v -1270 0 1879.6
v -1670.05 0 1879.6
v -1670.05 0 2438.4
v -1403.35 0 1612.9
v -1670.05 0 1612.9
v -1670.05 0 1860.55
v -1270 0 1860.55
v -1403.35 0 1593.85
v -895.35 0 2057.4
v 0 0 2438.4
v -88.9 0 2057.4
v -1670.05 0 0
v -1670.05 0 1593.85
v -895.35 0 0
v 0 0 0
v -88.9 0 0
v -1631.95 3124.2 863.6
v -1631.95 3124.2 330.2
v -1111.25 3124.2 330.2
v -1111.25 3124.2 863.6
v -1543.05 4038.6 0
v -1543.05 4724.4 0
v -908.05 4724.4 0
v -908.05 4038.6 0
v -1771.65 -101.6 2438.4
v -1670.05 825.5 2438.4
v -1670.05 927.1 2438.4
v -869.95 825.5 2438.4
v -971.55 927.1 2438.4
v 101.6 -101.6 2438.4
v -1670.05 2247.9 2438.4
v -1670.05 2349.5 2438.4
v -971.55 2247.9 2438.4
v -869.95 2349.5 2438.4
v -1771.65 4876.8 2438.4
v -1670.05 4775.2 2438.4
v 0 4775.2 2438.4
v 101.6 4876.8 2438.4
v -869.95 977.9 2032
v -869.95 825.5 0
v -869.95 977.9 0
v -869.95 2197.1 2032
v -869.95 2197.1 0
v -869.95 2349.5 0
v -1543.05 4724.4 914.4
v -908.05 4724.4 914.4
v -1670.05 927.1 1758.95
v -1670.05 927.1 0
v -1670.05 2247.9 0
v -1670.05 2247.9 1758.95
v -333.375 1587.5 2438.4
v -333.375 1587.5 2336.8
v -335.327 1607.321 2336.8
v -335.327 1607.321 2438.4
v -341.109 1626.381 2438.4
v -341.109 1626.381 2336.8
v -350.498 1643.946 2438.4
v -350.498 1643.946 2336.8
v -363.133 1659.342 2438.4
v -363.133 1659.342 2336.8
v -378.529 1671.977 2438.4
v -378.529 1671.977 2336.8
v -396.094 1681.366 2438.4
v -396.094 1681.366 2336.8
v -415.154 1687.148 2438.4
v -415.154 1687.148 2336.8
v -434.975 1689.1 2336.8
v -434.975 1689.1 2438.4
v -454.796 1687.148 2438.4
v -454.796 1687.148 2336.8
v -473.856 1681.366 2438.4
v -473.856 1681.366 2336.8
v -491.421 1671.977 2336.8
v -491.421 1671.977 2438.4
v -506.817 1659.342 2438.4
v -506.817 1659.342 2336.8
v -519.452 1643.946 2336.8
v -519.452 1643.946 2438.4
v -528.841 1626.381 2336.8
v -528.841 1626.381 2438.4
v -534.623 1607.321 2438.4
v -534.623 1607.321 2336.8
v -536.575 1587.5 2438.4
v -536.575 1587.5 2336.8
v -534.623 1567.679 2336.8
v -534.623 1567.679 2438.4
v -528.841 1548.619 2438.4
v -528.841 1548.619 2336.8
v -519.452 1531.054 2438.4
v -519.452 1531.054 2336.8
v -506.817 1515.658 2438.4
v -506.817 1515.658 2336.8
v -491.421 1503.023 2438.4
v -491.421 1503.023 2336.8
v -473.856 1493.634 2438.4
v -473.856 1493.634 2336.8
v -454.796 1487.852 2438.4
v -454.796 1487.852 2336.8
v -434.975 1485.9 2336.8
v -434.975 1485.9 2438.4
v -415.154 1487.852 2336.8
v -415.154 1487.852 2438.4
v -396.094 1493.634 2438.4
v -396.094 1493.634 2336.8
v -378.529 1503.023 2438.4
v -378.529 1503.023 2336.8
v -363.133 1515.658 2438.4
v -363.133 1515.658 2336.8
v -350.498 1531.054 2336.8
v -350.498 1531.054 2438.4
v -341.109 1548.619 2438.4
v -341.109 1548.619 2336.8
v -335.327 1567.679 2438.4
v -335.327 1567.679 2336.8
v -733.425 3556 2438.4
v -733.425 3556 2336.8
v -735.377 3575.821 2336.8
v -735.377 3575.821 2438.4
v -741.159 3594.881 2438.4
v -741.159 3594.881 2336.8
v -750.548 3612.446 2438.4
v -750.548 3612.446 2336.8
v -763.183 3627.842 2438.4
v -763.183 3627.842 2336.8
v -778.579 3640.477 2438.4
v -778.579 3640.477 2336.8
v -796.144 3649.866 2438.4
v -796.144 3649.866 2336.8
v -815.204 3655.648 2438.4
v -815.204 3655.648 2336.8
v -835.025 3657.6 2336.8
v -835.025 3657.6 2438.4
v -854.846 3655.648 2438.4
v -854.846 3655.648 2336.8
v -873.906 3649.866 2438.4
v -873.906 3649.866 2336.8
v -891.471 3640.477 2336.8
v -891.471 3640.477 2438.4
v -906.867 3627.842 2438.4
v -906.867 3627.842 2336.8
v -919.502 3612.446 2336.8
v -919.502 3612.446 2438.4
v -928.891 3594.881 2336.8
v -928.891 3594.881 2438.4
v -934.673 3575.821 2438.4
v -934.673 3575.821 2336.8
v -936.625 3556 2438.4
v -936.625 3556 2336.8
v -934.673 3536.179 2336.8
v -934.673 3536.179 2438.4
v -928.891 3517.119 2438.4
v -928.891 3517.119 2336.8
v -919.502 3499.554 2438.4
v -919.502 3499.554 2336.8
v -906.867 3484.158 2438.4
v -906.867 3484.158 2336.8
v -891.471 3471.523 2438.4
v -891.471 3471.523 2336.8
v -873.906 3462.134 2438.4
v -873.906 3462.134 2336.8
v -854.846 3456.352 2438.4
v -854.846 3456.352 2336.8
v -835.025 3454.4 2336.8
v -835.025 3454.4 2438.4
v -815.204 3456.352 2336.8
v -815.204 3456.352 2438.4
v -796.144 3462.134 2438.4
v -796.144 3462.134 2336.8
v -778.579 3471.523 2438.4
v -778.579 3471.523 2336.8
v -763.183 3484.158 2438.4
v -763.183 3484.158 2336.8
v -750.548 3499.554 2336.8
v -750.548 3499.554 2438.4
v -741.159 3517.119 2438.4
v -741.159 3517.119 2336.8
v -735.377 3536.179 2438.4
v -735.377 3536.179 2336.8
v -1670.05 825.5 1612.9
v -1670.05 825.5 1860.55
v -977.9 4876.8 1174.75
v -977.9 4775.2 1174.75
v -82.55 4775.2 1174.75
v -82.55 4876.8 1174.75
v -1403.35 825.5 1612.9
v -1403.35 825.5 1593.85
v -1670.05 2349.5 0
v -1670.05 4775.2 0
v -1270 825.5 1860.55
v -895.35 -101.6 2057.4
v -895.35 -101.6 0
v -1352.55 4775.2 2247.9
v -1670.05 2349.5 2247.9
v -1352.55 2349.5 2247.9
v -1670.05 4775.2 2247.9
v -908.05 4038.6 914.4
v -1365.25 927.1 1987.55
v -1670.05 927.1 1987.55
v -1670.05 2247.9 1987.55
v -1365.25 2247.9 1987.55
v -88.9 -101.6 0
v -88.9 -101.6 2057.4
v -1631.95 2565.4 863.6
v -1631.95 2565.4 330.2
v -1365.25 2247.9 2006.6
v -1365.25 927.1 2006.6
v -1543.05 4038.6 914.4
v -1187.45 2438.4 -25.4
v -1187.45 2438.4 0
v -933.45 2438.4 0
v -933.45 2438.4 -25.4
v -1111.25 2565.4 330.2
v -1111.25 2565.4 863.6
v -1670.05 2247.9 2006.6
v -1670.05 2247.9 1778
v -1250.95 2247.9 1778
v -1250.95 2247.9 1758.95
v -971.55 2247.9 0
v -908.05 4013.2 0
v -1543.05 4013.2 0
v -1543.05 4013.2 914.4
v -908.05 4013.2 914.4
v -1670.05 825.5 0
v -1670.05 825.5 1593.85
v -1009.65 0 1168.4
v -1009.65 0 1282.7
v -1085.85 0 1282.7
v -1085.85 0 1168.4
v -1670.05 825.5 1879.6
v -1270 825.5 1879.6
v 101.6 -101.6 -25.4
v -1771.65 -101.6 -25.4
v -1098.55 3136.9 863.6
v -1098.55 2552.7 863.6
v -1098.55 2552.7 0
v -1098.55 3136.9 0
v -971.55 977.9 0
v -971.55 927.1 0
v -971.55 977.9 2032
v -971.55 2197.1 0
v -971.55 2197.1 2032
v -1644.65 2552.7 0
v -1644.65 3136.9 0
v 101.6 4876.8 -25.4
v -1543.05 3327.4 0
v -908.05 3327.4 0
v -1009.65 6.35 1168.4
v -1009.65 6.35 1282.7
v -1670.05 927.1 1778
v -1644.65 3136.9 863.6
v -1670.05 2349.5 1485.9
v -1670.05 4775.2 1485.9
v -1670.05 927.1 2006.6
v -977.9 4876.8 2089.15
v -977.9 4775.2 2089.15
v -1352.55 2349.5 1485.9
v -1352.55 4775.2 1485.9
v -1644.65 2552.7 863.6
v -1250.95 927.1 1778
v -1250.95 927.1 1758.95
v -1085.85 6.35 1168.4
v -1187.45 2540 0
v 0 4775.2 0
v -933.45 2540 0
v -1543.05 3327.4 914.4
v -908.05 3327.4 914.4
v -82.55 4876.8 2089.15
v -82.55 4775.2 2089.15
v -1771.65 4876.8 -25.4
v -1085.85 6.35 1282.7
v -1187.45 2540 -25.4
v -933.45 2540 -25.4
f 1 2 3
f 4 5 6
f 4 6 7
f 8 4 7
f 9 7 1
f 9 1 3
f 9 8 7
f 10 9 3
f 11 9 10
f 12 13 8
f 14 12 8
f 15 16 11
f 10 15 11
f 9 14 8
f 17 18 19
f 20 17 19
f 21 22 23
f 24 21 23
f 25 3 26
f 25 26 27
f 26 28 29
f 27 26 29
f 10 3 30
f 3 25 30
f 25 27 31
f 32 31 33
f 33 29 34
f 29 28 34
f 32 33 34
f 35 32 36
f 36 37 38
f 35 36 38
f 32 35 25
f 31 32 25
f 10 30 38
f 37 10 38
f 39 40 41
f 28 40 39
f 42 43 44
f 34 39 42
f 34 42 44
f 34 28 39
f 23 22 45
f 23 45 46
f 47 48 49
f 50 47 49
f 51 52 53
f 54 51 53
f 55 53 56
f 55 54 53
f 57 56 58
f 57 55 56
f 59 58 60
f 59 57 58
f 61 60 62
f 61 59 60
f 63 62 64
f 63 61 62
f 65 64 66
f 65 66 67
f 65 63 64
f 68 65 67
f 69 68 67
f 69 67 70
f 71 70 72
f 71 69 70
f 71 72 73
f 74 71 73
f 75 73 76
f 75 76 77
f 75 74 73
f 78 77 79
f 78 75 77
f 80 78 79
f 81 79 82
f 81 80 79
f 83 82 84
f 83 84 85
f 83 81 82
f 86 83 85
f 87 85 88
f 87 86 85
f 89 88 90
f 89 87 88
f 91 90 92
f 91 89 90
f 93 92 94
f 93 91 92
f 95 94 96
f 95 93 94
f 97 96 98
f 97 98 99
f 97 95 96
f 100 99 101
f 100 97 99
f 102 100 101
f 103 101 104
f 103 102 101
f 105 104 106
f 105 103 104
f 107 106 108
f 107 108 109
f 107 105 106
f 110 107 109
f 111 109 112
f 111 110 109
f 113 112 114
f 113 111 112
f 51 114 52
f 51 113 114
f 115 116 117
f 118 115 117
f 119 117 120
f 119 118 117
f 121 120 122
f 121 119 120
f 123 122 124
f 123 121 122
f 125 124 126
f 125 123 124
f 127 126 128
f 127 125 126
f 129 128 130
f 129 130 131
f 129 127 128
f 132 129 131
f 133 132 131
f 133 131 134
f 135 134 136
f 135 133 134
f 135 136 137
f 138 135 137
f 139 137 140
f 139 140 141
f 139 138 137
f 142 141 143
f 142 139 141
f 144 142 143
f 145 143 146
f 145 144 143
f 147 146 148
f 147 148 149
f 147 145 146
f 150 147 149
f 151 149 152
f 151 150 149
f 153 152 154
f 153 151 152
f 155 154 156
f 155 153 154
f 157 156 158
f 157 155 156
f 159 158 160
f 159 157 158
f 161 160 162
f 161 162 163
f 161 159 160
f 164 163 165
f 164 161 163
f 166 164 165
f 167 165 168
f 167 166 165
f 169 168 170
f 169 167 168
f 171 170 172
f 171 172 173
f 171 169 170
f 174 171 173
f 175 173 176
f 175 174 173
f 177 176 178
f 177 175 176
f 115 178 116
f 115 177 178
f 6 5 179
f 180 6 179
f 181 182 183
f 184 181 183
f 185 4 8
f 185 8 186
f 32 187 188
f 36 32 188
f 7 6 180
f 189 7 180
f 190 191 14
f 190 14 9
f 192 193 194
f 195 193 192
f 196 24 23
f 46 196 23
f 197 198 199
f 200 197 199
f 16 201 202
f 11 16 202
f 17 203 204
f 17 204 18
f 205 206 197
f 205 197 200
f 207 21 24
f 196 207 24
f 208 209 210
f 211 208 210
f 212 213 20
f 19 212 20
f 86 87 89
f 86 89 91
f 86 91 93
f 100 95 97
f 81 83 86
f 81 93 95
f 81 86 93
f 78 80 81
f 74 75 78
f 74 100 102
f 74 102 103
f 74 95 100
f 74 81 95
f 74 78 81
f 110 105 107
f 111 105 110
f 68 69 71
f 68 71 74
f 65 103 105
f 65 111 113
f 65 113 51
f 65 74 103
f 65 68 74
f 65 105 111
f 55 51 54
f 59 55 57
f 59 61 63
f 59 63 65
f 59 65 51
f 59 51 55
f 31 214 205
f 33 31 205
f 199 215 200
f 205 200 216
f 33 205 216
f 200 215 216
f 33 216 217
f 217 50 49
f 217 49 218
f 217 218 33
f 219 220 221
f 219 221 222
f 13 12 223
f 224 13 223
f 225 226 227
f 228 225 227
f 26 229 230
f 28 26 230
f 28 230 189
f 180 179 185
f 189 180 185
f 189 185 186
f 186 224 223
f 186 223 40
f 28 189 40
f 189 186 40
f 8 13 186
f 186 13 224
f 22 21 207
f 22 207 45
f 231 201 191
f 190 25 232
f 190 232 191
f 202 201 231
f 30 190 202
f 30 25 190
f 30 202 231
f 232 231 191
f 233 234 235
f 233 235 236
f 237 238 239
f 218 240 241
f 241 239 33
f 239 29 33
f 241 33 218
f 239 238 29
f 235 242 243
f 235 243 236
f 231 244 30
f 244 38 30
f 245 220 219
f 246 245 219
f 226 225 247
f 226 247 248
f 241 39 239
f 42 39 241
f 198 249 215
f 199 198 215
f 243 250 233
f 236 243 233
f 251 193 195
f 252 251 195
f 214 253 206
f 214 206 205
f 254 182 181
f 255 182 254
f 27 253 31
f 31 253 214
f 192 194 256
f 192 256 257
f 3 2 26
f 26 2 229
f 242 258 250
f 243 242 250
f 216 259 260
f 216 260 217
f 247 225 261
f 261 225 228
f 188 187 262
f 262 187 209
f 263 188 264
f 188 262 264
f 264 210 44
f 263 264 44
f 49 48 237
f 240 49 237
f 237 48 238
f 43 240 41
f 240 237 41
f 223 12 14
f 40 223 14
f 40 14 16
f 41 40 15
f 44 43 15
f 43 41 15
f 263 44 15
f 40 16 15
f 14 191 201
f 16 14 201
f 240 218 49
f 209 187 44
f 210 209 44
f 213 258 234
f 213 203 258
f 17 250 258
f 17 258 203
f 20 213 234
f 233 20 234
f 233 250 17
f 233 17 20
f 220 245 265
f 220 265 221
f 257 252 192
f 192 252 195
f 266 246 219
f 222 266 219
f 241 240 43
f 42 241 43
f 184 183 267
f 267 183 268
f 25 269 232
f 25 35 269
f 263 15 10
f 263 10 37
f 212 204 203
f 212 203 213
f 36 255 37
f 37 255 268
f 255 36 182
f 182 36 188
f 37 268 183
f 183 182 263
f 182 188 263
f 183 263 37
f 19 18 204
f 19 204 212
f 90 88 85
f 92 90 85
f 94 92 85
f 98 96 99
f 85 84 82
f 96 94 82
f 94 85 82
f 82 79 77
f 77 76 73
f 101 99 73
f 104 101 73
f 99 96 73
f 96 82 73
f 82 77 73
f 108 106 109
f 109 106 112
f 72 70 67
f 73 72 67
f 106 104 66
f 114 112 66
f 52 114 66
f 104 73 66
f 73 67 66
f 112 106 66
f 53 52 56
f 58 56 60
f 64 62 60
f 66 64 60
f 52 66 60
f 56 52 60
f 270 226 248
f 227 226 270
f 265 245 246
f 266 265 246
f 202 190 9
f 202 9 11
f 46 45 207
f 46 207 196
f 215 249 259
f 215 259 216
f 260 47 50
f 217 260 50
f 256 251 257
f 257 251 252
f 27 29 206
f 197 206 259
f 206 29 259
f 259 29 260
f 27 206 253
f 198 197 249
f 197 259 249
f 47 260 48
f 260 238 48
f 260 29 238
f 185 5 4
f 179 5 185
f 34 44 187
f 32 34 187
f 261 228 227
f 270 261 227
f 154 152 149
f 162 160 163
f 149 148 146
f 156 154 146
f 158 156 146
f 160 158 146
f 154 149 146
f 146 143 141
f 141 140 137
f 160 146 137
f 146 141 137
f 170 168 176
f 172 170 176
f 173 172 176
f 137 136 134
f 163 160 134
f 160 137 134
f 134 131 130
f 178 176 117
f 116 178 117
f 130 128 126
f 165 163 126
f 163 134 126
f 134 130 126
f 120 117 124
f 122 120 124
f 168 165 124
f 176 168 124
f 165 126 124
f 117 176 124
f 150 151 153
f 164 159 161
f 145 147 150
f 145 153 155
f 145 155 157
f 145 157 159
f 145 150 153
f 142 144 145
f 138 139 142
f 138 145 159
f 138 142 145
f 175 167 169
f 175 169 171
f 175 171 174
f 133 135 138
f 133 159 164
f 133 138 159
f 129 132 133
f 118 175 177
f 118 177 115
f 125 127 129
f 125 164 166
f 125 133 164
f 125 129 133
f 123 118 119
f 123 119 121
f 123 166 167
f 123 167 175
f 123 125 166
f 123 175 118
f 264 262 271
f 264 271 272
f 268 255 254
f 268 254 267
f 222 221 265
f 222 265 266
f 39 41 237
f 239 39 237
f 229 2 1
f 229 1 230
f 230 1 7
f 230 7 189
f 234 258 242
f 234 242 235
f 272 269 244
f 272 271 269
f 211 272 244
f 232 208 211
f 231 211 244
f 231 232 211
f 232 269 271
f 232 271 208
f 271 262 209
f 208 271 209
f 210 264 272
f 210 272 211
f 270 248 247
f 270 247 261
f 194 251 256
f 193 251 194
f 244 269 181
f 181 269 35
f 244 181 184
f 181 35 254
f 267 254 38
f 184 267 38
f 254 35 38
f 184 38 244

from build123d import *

# Parameters (mm, degrees)
F0_W      = 1873.25
F0_H      = 4978.4
F0_W_2    = 1670.05
F0_H_2    = 4775.2
F1_DEPTH  = 2438.4
F2_W      = 806.45
F2_H      = 2057.4
F3_DEPTH  = 101.6
F4_W      = 895.35
F4_H      = 914.4
F5_DEPTH  = 101.6
F6_W      = 1873.25
F6_H      = 4978.4
F6_W_2    = 254
F6_H_2    = 101.6
F7_DEPTH  = 25.4
F9_DEPTH  = 2438.4
F10_W     = 1219.2
F10_H     = 406.4
F11_DEPTH = 101.6
F12_W     = 635
F12_H     = 685.8
F13_DEPTH = 914.4
F14_W     = 546.1
F14_H     = 584.2
F15_DEPTH = 863.6
F17_W     = 2425.7
F17_H     = 762
F18_DEPTH = 317.5
F16_W     = 520.7
F16_H     = 558.8
F19_DEPTH = 533.4
F20_W     = 825.5
F20_H     = 19.05
F21_DEPTH = 400.05
F22_W     = 825.5
F22_H     = 19.05
F23_DEPTH = 266.7
F24_W     = 1320.8
F24_H     = 19.05
F25_DEPTH = 304.8
F26_W     = 1320.8
F26_H     = 19.05
F27_DEPTH = 419.1
F28_W     = 76.2
F28_H     = 114.3
F29_DEPTH = 6.35
F30_R     = 101.6
F31_DEPTH = 101.6


with BuildPart() as f1:
    # F0 (on Top) → F1 (new body)
    with BuildSketch(Plane.XY):
        with Locations((-835.025, 2387.6)):
            Rectangle(F0_W, F0_H)
        with Locations((-835.025, 2387.6)):
            Rectangle(F0_W_2, F0_H_2, mode=Mode.SUBTRACT)
    extrude(amount=F1_DEPTH)

    # F2 (on face) → F3 (cut, through all)
    with BuildSketch(Plane.XZ.offset(101.6)):
        with Locations((-492.125, 1028.7)):
            Rectangle(F2_W, F2_H)
    extrude(amount=-F3_DEPTH, mode=Mode.SUBTRACT)

    # F4 (on face) → F5 (cut, through all)
    with BuildSketch(Plane.XZ.offset(-4775.2)):
        with Locations((-530.225, 1631.95)):
            Rectangle(F4_W, F4_H)
    extrude(amount=-F5_DEPTH, mode=Mode.SUBTRACT)

    # F6 (on face) → F7 (join)
    with BuildSketch(Plane(origin=(0, 0, 0), x_dir=(1, 0, 0), z_dir=(0, 0, -1))):
        with Locations((-835.025, -2387.6)):
            Rectangle(F6_W, F6_H)
        with Locations((-1060.45, -2489.2)):
            Rectangle(F6_W_2, F6_H_2, mode=Mode.SUBTRACT)
    extrude(amount=F7_DEPTH)

    # F8 (on face) → F9 (join, through all)
    with BuildSketch(Plane.XY):
        Polygon((-1670.05, 927.1), (-1670.05, 825.5), (-869.95, 825.5), (-869.95, 977.9), (-971.55, 977.9), (-971.55, 927.1), align=None)
        Polygon((-1670.05, 2349.5), (-1670.05, 2247.9), (-971.55, 2247.9), (-971.55, 2197.1), (-869.95, 2197.1), (-869.95, 2349.5), align=None)
    extrude(amount=F9_DEPTH)

    # F10 (on face) → F11 (join, through all)
    with BuildSketch(Plane.YZ.offset(-869.95)):
        with Locations((1587.5, 2235.2)):
            Rectangle(F10_W, F10_H)
    extrude(amount=-F11_DEPTH)

    # F20 (on face) → F21 (join)
    with BuildSketch(Plane.YZ.offset(-1670.05)):
        with Locations((412.75, 1870.075)):
            Rectangle(F20_W, F20_H)
    extrude(amount=F21_DEPTH)

    # F22 (on face) → F23 (join)
    with BuildSketch(Plane.YZ.offset(-1670.05)):
        with Locations((412.75, 1603.375)):
            Rectangle(F22_W, F22_H)
    extrude(amount=F23_DEPTH)

    # F24 (on face) → F25 (join)
    with BuildSketch(Plane.YZ.offset(-1670.05)):
        with Locations((1587.5, 1997.075)):
            Rectangle(F24_W, F24_H)
    extrude(amount=F25_DEPTH)

    # F26 (on face) → F27 (join)
    with BuildSketch(Plane.YZ.offset(-1670.05)):
        with Locations((1587.5, 1768.475)):
            Rectangle(F26_W, F26_H)
    extrude(amount=F27_DEPTH)


with BuildPart() as f13:
    # F12 (on face) → F13 (new body)
    with BuildSketch(Plane.XY):
        with Locations((-1225.55, 4381.5)):
            Rectangle(F12_W, F12_H)
        with Locations((-1225.55, 3670.3)):
            Rectangle(F12_W, F12_H)
    extrude(amount=F13_DEPTH)


with BuildPart() as f15:
    # F14 (on face) → F15 (new body)
    with BuildSketch(Plane.XY):
        with Locations((-1371.6, 2844.8)):
            Rectangle(F14_W, F14_H)
    extrude(amount=F15_DEPTH)

    # F16 (on face) → F19 (cut)
    with BuildSketch(Plane.XY.offset(863.6)):
        with Locations((-1371.6, 2844.8)):
            Rectangle(F16_W, F16_H)
    extrude(amount=-F19_DEPTH, mode=Mode.SUBTRACT)


with BuildPart() as f18:
    # F17 (on face) → F18 (new body)
    with BuildSketch(Plane.YZ.offset(-1670.05)):
        with Locations((3562.35, 1866.9)):
            Rectangle(F17_W, F17_H)
    extrude(amount=F18_DEPTH)


with BuildPart() as f29:
    # F28 (on face) → F29 (new body)
    with BuildSketch(Plane(origin=(0, 0, 0), x_dir=(-1, 0, 0), z_dir=(0, 1, 0))):
        with Locations((1047.75, 1225.55)):
            Rectangle(F28_W, F28_H)
    extrude(amount=F29_DEPTH)


with BuildPart() as f31:
    # F30 (on face) → F31 (new body)
    with BuildSketch(Plane.XY.offset(2438.4)):
        with Locations((-835.025, 3556)):
            Circle(F30_R)
        with Locations((-434.975, 1587.5)):
            Circle(F30_R)
    extrude(amount=-F31_DEPTH)


solid = Compound([f1.part, f13.part, f15.part, f18.part, f29.part, f31.part])
